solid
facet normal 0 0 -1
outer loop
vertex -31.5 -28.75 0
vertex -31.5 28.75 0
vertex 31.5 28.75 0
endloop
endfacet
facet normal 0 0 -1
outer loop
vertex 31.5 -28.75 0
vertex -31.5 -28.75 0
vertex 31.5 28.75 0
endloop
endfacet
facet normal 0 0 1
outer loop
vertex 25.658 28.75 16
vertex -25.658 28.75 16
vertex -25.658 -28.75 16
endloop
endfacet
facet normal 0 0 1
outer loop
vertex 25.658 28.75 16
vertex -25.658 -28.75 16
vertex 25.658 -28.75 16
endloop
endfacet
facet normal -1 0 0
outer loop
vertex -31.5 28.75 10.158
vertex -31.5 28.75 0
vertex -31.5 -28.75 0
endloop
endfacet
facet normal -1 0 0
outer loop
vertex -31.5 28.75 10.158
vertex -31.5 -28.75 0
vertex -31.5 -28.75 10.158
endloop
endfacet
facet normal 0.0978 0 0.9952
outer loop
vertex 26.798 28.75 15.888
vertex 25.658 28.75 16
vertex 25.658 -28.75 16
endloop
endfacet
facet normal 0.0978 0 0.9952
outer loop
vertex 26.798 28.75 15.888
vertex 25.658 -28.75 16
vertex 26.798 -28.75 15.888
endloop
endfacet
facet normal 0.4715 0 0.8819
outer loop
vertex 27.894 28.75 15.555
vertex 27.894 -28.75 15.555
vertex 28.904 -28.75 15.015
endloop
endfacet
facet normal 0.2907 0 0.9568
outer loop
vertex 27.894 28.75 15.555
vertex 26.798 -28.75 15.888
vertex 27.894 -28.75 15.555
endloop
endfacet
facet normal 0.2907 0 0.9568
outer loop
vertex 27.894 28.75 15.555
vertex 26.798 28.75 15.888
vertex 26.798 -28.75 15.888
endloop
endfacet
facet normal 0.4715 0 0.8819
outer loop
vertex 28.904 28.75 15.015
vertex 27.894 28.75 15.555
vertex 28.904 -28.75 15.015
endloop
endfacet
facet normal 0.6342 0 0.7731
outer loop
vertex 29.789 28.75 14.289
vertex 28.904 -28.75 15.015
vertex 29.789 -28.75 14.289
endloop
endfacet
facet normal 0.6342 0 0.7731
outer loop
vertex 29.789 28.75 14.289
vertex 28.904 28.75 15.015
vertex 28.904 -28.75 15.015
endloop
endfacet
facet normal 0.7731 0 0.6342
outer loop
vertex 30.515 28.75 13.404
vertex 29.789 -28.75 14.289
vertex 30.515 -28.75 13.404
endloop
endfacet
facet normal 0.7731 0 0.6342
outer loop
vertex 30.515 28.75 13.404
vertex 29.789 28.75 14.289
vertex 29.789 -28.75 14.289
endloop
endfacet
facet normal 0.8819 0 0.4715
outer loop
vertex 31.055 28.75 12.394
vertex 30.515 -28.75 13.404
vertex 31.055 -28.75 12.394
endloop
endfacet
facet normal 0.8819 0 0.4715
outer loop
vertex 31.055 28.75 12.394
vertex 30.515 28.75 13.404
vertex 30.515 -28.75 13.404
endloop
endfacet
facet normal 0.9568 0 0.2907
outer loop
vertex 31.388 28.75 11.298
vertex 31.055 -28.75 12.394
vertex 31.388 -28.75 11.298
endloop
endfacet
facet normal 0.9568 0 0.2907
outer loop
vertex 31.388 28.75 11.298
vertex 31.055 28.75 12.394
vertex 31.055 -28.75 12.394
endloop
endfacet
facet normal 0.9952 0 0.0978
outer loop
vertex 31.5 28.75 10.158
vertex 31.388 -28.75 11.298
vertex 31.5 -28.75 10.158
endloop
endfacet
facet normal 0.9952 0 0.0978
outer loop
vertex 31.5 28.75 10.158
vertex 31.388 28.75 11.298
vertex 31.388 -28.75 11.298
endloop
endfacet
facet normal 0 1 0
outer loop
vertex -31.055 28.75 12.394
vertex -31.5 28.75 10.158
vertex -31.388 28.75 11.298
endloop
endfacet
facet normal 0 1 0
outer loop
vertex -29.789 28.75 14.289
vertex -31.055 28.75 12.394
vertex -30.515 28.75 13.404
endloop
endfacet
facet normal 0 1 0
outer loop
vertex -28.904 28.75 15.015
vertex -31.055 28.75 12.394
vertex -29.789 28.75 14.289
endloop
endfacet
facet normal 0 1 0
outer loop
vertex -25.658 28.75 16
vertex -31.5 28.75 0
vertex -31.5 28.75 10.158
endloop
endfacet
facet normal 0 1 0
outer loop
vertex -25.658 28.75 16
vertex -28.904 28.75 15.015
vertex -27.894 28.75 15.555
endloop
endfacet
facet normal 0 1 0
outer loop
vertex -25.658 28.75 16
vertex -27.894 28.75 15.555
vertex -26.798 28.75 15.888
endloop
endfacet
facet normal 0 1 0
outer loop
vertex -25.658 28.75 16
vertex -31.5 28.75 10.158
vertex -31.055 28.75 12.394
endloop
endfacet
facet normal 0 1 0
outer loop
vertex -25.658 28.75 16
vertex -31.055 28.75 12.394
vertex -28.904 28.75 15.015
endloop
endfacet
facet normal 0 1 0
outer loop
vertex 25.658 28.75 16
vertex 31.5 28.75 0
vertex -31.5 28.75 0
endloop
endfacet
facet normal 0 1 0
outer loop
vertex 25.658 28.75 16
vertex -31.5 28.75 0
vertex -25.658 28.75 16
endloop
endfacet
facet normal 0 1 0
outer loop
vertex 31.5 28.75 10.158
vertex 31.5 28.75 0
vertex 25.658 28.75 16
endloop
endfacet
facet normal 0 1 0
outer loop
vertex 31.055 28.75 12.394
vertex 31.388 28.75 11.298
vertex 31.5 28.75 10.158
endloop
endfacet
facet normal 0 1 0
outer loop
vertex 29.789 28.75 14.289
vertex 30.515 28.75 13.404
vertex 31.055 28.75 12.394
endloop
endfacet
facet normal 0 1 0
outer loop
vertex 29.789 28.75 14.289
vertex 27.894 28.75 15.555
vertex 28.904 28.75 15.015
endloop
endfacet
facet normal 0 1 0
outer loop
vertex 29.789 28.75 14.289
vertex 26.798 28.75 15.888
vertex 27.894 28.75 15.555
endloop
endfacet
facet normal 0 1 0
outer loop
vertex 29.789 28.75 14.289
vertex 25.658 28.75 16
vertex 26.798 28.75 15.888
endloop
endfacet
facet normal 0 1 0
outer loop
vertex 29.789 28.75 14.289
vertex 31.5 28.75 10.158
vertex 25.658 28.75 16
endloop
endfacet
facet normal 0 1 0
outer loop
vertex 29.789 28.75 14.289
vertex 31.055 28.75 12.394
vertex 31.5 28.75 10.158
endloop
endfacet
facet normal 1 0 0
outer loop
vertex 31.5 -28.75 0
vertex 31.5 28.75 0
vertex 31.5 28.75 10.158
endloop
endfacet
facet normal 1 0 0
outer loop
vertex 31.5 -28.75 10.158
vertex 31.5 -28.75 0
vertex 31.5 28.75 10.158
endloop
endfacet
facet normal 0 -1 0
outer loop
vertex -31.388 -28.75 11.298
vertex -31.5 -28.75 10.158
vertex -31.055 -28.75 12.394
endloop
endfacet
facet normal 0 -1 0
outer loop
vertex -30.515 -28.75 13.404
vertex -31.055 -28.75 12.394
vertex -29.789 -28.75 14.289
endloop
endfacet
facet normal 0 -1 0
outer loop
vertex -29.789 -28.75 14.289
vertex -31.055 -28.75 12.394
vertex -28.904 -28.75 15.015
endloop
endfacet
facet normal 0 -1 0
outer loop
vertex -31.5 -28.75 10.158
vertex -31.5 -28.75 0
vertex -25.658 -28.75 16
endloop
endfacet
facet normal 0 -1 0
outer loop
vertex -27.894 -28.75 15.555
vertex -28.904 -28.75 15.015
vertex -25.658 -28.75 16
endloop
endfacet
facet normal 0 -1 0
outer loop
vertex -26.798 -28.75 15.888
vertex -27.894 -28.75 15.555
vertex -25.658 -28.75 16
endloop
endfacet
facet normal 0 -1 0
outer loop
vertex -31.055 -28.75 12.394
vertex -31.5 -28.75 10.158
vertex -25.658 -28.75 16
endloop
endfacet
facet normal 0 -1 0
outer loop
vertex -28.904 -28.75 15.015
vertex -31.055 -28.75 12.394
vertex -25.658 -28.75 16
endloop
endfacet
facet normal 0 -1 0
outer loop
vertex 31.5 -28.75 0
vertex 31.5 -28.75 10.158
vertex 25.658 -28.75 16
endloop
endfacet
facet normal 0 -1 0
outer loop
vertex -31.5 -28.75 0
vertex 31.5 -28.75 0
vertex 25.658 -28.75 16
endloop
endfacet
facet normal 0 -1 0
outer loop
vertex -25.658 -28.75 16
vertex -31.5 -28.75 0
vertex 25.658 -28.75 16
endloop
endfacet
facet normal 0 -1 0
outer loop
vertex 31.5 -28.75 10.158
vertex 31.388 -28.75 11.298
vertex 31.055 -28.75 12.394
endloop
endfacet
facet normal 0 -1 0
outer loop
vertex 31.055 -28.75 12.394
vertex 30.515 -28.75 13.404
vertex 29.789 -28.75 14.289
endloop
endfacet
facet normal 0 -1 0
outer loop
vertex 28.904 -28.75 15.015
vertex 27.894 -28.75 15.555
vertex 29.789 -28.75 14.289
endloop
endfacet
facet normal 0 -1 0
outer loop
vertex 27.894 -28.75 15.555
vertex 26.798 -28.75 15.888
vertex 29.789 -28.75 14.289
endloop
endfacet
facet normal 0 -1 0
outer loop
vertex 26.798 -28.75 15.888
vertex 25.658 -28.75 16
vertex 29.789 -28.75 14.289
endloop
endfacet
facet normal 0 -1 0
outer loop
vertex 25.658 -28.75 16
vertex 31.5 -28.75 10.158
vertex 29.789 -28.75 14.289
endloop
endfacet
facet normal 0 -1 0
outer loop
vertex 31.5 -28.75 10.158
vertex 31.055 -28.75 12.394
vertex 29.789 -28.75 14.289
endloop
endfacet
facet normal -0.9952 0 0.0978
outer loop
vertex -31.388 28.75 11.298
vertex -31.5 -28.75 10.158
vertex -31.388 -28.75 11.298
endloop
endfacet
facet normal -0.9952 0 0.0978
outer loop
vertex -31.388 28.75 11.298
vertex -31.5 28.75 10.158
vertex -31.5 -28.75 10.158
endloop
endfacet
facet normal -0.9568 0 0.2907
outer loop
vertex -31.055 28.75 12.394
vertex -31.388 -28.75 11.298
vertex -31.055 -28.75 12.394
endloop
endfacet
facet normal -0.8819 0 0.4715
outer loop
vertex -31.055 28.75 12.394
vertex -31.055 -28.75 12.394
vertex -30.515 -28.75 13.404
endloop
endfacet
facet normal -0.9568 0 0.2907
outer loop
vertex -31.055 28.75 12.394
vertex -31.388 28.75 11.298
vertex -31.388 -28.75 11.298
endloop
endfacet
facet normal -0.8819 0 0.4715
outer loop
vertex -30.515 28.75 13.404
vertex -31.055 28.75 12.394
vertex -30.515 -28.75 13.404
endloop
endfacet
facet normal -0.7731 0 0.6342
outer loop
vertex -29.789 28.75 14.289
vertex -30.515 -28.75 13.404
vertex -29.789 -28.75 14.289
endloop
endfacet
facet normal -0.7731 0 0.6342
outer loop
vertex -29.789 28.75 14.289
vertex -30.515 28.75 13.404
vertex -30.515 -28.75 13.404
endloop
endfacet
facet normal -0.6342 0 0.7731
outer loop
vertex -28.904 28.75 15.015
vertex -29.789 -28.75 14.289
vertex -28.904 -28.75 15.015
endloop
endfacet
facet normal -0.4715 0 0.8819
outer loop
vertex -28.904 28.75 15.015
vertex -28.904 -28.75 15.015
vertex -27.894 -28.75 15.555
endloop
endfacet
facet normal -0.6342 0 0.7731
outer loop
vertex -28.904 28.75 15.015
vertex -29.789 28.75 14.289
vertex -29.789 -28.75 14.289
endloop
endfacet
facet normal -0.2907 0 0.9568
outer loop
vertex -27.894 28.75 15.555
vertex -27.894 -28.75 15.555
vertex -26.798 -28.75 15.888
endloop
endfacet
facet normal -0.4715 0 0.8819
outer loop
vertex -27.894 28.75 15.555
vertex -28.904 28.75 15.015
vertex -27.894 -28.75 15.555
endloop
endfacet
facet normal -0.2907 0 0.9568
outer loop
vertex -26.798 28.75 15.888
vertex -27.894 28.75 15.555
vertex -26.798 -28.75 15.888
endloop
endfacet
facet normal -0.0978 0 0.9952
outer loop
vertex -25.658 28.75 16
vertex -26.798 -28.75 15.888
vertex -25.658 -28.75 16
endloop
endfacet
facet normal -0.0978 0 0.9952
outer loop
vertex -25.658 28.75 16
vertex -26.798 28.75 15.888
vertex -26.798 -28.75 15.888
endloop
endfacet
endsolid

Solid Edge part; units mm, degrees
sketch "Sketch1" plane through (0, 0, 0) normal (0, -1, 0) x (1, 0, 0)
  arc A0 (-31.5, 10.158) -> (-25.658, 16) centre (-25.658, 10.158) cw
  line L0 (-25.658, 16) -> (25.658, 16)
  arc A1 (31.5, 10.158) -> (25.658, 16) centre (25.658, 10.158) ccw
  line L1 (31.5, 0) -> (31.5, 10.158)
  line L2 (-31.5, 0) -> (31.5, 0)
  line L3 (-31.5, 0) -> (-31.5, 10.158)
extrude "Protrusion1" add sketch "Sketch1" along normal mid plane 57.5
